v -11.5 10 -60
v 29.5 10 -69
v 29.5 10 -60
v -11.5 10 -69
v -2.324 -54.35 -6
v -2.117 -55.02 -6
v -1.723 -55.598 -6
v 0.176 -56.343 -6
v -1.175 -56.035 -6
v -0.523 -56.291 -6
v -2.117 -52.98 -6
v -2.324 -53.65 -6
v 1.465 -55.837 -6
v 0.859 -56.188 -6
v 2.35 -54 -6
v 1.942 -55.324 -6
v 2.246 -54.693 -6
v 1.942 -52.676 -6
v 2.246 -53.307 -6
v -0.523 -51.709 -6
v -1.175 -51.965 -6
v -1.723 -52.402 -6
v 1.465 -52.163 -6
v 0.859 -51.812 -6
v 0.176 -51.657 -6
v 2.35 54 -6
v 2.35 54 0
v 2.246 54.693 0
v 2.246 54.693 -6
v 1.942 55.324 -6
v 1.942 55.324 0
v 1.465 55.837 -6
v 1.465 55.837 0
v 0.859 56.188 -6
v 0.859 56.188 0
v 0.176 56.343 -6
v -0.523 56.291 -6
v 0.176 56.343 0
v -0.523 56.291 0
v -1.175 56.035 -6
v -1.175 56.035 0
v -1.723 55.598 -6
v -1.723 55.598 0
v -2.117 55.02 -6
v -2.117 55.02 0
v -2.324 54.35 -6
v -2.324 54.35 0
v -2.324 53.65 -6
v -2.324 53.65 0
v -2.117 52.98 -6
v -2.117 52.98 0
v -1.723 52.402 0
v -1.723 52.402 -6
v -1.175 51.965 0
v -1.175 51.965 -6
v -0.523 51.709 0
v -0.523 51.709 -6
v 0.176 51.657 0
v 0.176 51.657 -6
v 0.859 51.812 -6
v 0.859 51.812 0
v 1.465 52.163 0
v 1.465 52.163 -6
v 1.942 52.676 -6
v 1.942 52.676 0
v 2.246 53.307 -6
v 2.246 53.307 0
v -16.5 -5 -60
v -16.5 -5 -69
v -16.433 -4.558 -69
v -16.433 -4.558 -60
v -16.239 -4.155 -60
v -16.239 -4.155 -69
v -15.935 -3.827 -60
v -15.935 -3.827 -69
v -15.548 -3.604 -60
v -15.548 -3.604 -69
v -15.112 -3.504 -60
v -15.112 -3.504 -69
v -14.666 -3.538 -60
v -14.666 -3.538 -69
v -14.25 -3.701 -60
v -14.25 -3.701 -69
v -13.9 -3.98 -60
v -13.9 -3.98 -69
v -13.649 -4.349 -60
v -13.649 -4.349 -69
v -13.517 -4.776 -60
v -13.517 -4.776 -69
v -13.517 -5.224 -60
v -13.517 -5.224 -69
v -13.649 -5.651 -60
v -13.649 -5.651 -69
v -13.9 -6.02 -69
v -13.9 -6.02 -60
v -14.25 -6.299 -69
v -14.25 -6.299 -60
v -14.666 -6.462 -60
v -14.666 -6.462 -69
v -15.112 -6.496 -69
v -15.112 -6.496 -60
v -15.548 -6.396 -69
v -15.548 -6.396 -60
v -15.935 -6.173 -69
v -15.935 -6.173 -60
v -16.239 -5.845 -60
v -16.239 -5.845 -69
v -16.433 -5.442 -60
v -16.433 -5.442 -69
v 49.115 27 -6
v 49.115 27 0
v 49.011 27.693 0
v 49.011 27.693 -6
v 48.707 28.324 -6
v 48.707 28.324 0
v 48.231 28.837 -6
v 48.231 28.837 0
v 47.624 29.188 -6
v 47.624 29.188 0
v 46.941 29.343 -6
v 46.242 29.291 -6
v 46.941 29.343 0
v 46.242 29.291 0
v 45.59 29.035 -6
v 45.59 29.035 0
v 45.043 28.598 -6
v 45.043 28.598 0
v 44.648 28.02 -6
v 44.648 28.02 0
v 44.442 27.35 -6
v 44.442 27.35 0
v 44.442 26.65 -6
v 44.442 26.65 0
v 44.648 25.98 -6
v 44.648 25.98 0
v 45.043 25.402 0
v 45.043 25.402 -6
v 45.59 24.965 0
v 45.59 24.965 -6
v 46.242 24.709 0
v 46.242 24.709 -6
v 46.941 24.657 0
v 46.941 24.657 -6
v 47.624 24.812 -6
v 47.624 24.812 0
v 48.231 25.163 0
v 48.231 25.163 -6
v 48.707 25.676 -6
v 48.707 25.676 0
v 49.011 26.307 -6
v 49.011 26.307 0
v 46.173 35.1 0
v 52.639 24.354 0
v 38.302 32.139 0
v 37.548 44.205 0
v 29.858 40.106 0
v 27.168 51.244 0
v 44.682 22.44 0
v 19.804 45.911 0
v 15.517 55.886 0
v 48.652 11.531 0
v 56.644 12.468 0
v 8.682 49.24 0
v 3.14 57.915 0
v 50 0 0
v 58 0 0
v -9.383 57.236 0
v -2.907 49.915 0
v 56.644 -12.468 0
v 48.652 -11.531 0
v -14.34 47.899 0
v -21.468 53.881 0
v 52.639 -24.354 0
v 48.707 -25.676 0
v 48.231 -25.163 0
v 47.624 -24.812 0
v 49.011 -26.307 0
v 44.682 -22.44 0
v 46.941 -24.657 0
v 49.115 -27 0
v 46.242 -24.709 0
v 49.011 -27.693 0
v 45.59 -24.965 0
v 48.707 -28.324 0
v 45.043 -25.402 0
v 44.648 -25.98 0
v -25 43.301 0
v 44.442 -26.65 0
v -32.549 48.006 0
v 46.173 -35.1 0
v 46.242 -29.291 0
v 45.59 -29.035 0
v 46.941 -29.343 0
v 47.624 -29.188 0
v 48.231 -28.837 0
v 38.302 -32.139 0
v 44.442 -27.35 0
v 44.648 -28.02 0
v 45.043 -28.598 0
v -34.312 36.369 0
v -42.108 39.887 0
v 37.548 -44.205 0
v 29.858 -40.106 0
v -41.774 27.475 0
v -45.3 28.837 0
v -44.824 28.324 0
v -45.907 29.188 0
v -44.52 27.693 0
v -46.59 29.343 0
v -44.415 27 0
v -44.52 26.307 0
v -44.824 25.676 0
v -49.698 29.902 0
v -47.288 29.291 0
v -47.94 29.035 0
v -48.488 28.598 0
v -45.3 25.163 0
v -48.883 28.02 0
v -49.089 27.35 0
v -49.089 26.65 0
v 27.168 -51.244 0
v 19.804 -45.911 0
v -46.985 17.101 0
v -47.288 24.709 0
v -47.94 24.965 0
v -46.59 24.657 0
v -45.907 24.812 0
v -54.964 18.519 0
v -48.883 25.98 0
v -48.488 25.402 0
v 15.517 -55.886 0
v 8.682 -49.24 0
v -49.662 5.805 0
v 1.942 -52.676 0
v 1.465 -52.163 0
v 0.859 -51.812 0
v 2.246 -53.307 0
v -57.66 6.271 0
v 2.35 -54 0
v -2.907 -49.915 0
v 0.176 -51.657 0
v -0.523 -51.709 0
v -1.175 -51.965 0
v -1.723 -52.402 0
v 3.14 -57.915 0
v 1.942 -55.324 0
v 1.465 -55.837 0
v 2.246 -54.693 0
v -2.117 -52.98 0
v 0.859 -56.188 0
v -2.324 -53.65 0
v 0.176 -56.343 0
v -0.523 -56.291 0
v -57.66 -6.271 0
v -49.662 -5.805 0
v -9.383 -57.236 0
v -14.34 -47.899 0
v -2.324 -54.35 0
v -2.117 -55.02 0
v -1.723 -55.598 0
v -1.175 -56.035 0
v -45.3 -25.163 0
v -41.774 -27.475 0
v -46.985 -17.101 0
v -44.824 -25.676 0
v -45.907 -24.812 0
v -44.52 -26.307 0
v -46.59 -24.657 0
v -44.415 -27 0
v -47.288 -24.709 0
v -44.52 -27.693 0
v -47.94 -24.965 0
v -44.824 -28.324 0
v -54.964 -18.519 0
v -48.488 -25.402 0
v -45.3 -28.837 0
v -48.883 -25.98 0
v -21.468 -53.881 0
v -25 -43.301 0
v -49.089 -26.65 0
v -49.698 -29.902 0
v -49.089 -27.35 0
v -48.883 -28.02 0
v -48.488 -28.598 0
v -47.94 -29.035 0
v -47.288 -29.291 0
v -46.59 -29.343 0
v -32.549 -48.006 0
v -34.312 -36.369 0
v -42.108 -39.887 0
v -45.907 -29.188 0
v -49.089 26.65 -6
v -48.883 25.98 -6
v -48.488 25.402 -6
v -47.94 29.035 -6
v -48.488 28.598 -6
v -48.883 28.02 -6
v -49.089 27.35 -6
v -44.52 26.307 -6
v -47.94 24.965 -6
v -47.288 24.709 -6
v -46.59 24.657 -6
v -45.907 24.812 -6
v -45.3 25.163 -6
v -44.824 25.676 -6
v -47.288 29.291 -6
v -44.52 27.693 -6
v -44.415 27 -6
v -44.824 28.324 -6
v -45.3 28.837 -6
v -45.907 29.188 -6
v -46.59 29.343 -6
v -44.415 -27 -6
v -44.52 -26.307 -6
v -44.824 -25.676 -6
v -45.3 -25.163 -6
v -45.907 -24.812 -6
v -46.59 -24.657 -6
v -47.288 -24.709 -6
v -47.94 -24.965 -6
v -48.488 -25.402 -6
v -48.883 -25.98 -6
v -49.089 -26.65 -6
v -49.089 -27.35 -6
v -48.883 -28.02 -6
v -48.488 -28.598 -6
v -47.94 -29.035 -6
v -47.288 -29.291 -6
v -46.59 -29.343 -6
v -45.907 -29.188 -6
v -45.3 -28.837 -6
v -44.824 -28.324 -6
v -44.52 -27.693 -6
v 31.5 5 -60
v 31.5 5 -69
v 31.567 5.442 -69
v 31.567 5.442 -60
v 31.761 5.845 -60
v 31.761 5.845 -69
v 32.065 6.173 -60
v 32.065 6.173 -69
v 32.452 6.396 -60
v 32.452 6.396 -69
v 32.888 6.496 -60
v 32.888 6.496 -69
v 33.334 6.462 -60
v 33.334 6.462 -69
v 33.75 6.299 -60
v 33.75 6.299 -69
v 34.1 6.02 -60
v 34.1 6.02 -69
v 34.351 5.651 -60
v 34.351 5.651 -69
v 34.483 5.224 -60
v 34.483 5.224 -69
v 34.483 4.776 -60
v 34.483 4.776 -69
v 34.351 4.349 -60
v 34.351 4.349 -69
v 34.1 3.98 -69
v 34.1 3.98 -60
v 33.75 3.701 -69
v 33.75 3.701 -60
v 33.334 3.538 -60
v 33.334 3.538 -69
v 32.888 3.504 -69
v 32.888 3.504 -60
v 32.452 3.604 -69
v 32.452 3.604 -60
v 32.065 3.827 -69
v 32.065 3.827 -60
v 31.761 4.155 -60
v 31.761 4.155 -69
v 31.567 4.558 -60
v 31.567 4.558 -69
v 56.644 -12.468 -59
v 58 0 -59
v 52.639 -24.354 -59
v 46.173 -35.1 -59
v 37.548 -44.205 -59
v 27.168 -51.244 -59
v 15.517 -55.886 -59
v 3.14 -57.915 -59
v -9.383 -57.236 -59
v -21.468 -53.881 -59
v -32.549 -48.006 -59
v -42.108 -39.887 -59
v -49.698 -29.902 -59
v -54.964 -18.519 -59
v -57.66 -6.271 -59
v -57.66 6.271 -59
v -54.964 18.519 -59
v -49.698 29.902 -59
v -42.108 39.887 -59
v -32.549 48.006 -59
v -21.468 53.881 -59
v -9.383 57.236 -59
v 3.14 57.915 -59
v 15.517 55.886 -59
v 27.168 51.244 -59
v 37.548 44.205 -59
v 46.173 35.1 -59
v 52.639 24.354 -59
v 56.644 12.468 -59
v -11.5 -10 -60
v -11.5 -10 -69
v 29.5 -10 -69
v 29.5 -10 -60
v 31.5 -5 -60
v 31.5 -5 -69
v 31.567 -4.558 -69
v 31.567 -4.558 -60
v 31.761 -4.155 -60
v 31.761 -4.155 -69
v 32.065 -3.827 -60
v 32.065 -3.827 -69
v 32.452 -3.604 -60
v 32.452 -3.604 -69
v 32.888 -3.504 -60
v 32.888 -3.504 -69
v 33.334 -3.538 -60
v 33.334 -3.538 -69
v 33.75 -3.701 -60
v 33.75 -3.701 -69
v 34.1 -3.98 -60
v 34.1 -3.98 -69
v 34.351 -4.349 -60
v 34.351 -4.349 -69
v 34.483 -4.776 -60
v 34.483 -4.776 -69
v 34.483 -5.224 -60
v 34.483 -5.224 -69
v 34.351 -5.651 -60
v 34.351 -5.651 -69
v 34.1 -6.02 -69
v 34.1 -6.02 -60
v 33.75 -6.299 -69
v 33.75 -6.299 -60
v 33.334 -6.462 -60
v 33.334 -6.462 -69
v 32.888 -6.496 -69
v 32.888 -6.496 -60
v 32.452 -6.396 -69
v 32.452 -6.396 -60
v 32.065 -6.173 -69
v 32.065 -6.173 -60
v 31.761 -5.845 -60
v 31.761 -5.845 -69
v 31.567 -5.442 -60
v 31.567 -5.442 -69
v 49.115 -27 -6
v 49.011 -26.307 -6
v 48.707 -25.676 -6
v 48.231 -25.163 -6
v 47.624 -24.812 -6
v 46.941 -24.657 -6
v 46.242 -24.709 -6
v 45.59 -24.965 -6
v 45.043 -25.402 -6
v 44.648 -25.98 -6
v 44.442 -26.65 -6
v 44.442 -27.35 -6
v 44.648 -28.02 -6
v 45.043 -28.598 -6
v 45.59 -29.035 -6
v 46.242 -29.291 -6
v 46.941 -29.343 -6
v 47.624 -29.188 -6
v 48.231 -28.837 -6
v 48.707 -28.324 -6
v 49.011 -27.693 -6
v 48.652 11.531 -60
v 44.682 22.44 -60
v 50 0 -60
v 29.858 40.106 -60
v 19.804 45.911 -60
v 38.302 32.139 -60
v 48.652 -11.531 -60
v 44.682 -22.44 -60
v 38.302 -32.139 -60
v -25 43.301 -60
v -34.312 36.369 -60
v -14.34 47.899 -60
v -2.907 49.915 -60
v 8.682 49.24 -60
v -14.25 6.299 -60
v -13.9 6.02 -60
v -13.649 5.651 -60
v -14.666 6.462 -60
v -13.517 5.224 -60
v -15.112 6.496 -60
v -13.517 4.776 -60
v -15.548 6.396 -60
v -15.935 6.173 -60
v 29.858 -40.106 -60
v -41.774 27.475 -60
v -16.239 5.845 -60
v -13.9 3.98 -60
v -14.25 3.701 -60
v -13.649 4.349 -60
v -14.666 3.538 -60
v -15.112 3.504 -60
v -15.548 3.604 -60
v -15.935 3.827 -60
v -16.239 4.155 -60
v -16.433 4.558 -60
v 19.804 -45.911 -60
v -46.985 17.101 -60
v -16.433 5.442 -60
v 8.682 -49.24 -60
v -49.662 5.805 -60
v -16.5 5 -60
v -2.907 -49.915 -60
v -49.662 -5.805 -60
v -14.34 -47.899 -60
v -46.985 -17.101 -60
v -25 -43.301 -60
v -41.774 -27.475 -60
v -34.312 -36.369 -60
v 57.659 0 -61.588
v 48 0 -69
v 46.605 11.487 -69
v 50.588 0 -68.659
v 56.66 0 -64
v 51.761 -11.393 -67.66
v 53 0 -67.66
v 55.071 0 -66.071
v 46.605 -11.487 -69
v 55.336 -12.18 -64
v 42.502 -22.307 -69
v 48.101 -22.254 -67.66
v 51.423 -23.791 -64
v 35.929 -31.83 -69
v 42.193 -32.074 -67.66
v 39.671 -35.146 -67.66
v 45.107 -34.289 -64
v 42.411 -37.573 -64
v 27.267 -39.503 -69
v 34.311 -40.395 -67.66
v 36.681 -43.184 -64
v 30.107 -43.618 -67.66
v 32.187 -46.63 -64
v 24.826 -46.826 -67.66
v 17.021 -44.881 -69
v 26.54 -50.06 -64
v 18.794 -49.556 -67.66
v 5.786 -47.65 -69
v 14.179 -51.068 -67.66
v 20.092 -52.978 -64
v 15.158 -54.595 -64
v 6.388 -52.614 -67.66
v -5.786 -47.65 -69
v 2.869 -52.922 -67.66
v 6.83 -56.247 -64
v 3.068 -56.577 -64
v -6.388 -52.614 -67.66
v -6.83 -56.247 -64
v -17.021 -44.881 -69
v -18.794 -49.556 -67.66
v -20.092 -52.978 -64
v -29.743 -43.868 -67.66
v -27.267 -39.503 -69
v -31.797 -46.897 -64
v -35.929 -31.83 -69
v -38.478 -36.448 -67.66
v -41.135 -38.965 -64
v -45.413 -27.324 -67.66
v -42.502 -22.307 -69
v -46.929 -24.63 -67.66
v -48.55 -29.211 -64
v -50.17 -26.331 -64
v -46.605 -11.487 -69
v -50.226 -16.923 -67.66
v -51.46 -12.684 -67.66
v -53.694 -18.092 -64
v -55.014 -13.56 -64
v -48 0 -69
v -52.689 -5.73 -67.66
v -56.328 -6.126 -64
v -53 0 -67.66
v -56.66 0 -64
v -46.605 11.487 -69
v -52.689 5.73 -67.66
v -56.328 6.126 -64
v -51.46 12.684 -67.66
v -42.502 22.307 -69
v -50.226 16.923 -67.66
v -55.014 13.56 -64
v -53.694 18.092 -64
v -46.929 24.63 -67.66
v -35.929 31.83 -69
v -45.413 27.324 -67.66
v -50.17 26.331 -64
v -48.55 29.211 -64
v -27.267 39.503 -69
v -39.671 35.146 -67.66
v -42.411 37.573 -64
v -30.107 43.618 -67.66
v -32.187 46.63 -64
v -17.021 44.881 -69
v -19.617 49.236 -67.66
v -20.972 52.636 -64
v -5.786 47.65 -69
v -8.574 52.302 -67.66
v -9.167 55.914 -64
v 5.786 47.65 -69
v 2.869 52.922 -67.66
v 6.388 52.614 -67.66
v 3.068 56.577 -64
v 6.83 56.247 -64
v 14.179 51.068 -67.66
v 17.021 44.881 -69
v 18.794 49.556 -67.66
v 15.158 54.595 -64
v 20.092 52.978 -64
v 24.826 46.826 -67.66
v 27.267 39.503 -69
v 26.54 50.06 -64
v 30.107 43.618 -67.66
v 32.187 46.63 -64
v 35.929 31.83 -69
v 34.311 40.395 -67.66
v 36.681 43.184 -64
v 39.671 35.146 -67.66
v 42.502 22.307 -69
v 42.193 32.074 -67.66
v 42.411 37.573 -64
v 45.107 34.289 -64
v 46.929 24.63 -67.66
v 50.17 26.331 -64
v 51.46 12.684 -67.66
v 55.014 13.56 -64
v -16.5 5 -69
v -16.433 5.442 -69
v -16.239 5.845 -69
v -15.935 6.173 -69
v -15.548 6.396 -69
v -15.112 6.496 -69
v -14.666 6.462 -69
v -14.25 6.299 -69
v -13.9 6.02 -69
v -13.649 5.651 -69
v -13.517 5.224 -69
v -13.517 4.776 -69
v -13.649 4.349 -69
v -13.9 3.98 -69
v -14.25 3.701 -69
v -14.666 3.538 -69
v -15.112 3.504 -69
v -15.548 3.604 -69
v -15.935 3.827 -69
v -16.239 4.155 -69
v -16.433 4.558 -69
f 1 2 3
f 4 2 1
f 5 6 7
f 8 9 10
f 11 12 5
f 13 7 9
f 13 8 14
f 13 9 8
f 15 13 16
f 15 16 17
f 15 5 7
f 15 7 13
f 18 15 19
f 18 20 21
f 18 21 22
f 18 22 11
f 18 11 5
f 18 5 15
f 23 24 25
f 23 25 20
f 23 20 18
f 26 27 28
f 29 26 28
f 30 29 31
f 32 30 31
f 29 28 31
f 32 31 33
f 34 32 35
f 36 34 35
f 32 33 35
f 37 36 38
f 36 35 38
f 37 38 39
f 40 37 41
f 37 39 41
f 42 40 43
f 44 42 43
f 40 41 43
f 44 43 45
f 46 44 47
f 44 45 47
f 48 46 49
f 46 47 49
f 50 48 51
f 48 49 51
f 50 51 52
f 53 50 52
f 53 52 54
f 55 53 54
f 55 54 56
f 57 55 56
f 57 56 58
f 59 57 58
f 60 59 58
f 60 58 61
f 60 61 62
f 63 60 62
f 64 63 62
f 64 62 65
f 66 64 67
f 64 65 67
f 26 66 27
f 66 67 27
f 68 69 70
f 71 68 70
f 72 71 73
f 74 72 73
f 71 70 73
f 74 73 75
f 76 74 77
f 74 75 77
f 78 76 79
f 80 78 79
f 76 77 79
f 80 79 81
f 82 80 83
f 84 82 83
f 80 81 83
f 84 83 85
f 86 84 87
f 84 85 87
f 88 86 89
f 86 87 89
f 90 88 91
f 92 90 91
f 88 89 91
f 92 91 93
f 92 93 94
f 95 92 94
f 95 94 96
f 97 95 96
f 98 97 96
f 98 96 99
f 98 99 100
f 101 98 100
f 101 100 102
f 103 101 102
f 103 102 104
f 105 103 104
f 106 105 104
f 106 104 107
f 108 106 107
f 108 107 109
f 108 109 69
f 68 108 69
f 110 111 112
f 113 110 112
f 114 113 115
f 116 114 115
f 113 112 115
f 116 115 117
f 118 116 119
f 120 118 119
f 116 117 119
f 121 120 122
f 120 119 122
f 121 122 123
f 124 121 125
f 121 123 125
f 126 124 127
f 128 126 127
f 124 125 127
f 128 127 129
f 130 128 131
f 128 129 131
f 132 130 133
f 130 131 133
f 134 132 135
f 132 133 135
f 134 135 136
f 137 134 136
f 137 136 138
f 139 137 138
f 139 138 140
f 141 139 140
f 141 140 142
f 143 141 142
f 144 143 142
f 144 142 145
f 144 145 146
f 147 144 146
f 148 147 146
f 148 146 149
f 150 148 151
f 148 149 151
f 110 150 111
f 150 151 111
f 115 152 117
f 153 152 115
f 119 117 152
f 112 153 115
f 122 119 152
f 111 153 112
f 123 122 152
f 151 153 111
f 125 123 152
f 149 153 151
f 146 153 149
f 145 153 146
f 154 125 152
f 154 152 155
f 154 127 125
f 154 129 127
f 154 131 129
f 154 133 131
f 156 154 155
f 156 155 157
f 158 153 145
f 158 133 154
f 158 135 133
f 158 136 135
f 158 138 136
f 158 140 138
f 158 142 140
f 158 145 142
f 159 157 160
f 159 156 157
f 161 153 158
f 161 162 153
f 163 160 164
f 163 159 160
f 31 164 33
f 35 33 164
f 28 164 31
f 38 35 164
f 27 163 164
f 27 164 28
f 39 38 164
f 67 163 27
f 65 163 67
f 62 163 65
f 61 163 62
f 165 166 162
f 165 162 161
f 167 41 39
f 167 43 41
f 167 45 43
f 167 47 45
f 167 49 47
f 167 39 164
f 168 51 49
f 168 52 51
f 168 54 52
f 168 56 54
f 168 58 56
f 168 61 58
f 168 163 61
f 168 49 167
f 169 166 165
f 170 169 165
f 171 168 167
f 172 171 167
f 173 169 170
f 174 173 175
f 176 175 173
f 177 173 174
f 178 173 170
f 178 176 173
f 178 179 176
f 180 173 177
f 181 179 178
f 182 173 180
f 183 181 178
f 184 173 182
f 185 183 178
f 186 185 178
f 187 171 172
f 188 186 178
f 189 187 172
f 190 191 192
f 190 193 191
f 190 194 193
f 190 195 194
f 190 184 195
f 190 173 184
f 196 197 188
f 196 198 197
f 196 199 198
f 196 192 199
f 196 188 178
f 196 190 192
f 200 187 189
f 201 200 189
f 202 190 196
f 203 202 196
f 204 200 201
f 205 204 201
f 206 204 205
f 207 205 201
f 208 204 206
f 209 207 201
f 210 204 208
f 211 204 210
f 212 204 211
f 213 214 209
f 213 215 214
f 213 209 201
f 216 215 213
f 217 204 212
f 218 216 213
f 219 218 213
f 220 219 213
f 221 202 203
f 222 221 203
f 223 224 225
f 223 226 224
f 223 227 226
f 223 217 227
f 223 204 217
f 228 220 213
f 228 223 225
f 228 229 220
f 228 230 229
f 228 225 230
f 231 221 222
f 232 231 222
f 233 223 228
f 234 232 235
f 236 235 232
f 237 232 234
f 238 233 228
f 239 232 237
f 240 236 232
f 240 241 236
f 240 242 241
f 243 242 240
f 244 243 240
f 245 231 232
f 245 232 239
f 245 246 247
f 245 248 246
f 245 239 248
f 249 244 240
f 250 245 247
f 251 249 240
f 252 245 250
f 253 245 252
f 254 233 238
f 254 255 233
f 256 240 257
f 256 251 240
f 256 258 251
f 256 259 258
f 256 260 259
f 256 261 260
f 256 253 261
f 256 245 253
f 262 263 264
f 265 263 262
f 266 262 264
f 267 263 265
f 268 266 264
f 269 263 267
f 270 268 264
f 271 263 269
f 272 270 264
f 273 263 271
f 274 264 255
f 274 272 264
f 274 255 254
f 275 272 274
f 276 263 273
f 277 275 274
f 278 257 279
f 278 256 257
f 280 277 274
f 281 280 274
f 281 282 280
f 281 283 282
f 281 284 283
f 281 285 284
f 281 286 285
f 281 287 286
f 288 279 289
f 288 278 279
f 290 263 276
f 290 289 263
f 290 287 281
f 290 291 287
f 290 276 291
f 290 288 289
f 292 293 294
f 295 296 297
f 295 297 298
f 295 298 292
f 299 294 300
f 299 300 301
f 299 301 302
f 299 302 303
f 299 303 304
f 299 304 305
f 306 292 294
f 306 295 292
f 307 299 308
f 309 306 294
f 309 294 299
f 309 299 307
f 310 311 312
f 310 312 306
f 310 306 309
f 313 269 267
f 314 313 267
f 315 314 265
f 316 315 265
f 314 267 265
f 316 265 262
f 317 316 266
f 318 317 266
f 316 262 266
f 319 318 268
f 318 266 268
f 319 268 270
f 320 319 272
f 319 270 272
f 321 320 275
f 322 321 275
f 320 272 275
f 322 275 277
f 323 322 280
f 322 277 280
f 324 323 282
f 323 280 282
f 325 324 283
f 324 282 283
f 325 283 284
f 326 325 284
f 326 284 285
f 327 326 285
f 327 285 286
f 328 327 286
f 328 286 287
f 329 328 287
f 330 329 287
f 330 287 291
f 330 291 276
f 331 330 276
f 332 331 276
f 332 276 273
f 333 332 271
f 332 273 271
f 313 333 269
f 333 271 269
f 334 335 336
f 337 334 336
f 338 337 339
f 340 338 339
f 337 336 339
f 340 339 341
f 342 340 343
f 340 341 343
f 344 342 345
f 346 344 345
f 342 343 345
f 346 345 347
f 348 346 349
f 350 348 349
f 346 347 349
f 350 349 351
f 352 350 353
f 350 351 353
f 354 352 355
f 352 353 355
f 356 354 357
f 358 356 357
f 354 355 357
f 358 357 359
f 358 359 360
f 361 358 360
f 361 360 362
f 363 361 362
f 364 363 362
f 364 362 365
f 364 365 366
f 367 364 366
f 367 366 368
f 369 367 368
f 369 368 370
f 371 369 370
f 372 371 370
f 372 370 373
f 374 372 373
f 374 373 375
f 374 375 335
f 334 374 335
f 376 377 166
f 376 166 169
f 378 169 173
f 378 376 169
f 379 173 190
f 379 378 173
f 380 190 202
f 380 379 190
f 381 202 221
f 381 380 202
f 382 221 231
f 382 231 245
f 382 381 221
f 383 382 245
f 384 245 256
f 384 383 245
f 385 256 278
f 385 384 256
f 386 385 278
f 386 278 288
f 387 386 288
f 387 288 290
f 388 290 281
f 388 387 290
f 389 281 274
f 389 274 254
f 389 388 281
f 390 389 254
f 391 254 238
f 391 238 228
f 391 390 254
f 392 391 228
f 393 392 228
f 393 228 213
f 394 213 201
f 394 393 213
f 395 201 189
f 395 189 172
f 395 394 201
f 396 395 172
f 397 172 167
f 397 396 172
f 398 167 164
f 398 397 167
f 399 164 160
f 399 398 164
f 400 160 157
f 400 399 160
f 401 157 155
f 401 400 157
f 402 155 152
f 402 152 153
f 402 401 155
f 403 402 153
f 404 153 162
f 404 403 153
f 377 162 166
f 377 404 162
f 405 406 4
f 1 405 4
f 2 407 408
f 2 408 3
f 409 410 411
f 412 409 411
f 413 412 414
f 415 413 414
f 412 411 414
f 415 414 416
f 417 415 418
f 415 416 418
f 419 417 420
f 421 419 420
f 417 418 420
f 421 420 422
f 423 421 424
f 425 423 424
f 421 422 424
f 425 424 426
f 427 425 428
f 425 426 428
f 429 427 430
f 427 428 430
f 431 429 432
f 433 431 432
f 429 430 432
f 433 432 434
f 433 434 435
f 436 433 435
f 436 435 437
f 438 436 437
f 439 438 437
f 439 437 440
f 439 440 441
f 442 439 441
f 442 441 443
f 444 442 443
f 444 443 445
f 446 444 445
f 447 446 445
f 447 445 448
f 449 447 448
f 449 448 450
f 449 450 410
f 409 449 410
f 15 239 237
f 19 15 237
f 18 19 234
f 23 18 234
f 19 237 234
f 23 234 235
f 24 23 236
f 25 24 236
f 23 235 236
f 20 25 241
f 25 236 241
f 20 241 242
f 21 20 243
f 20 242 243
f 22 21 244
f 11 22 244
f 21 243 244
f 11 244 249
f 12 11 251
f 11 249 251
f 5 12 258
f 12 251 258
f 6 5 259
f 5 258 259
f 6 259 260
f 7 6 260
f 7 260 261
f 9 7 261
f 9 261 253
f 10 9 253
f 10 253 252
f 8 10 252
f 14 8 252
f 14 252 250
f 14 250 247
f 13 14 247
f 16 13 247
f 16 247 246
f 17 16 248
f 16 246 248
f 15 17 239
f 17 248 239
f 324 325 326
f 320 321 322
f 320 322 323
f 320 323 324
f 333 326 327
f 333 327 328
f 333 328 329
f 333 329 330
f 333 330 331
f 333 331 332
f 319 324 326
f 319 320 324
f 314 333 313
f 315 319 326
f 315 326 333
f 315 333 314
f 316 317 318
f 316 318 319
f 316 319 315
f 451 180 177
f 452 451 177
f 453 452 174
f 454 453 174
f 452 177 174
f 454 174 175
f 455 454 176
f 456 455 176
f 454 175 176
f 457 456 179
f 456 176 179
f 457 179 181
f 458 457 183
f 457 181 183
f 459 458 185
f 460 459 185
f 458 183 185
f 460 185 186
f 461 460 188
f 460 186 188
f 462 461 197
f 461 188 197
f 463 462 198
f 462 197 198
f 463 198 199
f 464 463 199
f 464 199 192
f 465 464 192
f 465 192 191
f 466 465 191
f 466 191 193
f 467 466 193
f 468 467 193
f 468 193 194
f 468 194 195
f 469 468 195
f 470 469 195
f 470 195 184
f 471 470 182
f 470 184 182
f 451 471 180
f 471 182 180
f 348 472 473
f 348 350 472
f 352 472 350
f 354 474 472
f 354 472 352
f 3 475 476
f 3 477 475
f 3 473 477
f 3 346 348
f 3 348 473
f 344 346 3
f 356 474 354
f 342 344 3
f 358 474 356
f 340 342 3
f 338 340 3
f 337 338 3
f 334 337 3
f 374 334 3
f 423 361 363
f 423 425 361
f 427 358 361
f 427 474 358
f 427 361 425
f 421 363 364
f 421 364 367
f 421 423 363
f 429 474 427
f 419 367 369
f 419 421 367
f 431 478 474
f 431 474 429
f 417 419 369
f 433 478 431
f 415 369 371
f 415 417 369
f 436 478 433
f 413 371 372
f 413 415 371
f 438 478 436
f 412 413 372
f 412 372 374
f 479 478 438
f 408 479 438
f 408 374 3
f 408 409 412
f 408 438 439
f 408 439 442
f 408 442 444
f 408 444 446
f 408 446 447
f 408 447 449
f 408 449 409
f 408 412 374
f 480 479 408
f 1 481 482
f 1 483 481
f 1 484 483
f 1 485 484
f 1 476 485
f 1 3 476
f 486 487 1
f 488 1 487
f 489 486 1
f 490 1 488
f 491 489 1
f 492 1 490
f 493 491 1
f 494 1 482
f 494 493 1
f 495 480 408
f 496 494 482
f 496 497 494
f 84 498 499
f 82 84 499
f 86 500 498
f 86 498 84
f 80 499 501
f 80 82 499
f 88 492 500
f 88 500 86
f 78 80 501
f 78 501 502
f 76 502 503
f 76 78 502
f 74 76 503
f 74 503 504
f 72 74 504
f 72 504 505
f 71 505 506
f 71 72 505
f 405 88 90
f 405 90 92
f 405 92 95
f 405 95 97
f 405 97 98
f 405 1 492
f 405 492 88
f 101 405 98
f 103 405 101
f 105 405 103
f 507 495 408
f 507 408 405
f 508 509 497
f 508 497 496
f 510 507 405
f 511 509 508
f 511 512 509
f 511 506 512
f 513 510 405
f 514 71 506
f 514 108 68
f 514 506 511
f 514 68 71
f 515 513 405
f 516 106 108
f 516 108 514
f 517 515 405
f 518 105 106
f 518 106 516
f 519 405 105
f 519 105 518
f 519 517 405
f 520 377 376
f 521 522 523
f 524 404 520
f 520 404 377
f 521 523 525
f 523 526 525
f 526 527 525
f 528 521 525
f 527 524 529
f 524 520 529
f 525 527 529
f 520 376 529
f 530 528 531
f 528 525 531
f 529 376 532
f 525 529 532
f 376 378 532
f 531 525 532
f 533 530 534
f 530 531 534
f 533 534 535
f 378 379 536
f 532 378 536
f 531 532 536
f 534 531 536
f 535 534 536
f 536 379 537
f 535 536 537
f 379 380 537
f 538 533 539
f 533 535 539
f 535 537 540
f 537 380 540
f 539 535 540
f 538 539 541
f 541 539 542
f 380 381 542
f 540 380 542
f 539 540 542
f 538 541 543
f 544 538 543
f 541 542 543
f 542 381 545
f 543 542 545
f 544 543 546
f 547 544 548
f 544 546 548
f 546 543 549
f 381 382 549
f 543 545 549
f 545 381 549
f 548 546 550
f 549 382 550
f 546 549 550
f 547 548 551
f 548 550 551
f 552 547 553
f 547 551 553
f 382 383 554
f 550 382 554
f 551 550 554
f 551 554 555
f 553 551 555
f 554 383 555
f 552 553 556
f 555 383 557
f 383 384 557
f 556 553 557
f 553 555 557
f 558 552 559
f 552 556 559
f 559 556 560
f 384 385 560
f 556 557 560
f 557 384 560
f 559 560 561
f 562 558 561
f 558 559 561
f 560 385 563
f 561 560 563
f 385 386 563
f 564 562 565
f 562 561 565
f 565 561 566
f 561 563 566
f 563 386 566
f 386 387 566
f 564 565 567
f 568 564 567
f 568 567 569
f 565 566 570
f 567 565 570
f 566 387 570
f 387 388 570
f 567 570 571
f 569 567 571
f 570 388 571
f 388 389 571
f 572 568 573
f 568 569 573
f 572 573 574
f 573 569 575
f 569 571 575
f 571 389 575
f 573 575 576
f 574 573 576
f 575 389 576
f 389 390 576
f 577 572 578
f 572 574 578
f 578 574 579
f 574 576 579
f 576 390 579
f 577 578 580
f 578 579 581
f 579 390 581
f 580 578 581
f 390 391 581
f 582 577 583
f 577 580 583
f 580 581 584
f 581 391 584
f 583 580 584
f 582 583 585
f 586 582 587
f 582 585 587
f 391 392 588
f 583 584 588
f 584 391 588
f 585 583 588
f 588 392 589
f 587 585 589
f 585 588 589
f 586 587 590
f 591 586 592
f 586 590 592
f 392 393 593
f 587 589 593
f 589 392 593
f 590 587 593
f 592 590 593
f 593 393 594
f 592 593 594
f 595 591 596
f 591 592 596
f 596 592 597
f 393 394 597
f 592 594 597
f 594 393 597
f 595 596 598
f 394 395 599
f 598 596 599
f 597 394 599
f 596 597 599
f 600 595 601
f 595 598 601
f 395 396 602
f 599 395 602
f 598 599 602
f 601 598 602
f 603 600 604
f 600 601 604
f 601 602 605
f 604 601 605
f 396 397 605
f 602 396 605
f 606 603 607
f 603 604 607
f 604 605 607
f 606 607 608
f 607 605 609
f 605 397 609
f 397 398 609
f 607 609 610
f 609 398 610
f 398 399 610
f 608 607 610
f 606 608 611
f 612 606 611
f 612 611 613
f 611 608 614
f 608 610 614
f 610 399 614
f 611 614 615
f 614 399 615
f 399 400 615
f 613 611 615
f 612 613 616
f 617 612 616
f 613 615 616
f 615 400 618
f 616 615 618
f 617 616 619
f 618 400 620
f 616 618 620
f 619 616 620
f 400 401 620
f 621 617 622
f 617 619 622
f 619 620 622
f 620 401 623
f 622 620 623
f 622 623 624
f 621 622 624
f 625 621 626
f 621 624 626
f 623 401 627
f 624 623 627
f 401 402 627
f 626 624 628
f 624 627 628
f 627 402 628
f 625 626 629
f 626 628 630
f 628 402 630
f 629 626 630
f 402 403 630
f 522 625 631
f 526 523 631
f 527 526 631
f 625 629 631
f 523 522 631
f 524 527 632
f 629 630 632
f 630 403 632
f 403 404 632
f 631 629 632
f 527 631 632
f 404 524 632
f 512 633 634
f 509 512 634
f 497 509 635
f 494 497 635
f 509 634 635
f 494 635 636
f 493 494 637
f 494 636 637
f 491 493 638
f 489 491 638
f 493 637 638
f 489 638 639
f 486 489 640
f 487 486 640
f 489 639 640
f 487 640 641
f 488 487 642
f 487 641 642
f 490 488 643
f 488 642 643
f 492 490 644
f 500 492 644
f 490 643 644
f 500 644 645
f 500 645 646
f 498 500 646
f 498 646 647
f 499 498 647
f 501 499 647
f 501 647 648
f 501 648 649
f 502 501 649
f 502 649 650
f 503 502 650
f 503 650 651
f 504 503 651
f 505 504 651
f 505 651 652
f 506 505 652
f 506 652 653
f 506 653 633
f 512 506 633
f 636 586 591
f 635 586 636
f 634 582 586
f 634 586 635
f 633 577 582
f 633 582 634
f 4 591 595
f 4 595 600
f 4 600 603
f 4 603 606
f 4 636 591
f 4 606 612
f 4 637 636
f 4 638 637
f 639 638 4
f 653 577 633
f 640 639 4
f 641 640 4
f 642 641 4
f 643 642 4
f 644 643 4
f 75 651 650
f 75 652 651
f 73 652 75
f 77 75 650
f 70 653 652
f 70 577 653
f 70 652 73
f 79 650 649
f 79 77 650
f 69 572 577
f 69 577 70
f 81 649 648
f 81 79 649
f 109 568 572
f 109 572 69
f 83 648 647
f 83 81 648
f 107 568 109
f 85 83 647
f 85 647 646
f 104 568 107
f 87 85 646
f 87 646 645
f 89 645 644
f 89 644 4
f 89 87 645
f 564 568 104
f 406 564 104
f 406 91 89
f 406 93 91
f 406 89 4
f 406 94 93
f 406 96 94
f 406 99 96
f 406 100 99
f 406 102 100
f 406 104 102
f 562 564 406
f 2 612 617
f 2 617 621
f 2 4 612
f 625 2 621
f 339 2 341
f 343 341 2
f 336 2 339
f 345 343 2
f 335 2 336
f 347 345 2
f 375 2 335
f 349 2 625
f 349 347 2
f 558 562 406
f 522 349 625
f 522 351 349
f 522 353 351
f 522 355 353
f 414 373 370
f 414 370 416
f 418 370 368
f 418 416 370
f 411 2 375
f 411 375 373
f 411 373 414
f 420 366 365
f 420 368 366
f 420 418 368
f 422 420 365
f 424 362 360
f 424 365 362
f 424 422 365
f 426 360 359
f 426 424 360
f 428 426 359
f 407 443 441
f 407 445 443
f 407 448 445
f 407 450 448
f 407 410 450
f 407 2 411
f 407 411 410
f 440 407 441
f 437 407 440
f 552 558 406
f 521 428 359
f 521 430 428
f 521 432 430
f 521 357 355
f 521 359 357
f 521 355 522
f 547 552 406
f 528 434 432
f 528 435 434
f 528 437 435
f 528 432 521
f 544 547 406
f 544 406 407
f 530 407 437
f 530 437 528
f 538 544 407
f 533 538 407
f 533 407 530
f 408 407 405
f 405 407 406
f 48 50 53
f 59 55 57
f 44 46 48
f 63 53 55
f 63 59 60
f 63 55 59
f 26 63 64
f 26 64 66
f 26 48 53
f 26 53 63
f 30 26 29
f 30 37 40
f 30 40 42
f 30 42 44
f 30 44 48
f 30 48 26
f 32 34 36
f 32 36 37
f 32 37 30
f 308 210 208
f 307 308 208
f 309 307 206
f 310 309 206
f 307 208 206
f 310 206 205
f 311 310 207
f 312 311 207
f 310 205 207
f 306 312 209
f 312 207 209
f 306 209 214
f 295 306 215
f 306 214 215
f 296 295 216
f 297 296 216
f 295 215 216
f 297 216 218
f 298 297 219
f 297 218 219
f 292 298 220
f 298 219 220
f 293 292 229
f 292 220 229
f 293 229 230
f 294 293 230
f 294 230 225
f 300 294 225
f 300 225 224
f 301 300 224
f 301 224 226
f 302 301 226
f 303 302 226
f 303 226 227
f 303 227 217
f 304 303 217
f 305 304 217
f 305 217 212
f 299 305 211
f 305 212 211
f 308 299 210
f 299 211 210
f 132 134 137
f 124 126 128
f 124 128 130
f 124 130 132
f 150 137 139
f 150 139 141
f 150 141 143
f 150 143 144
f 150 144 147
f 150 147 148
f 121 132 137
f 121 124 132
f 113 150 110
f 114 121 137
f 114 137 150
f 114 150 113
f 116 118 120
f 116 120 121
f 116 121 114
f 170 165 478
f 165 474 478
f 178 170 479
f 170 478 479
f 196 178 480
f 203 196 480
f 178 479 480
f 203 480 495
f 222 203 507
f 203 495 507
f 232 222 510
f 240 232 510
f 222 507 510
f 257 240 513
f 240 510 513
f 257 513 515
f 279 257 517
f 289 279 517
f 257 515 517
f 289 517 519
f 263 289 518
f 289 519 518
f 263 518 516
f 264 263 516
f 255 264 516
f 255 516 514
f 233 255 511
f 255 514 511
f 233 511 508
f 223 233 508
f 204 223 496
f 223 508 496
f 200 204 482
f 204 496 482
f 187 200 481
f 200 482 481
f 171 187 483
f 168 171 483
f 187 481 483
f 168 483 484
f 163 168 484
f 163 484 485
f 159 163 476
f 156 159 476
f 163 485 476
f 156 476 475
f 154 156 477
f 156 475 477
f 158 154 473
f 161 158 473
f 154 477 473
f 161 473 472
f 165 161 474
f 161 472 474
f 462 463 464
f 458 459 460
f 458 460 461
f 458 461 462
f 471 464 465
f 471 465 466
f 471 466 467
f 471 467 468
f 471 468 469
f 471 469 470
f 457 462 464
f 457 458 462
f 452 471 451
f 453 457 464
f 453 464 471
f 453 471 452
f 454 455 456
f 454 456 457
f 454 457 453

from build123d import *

# Parameters (mm, degrees)
SKETCH2_W          = 50
SKETCH2_H          = 9
SKETCH2_W_2        = 8
SKETCH2_H_2        = 60
SKETCH3_R          = 2.35
CUT_EXTRUDE1_DEPTH = 6
CUT_EXTRUDE2_REACH = 109.187
SKETCH4_R          = 1.5
SKETCH4_W          = 41
SKETCH4_H          = 20
FILLET1_R          = 10


with BuildPart() as part:
    # Sketch2 → Revolve1 (revolve)
    with BuildSketch(Plane(origin=(0, 0, 0), x_dir=(1, 0, 0), z_dir=(0, 1, 0))):
        with Locations((25, 64.5)):
            Rectangle(SKETCH2_W, SKETCH2_H)
        with Locations((54, 64.5)):
            Rectangle(SKETCH2_W_2, SKETCH2_H)
        with Locations((54, 30)):
            Rectangle(SKETCH2_W_2, SKETCH2_H_2)
    revolve(axis=Axis((0, 0, 1000), (0, 0, -1)))

    # Sketch3 → Cut-Extrude1 (cut)
    with BuildSketch(Plane.XY):
        with Locations((46.765371804, 27)):
            Circle(SKETCH3_R)
        with Locations((0, 54)):
            Circle(SKETCH3_R)
        with Locations((46.765371804, -27)):
            Circle(SKETCH3_R)
        with Locations((0, -54)):
            Circle(SKETCH3_R)
        with Locations((-46.765371804, -27)):
            Circle(SKETCH3_R)
        with Locations((-46.765371804, 27)):
            Circle(SKETCH3_R)
    extrude(amount=-CUT_EXTRUDE1_DEPTH, mode=Mode.SUBTRACT)

    # Sketch4 → Cut-Extrude2 (cut, up to next)
    with BuildSketch(Plane(origin=(0, 0, -69), x_dir=(-1, 0, 0), z_dir=(0, 0, -1)), mode=Mode.PRIVATE) as cut_extrude2_sk1:
        with Locations((15, 5)):
            Circle(SKETCH4_R)
    cut_extrude2_tool1 = extrude(cut_extrude2_sk1.sketch, amount=-CUT_EXTRUDE2_REACH, mode=Mode.PRIVATE) & part.part
    # Sketch4 → Cut-Extrude2 (cut, up to next)
    with BuildSketch(Plane(origin=(0, 0, -69), x_dir=(-1, 0, 0), z_dir=(0, 0, -1)), mode=Mode.PRIVATE) as cut_extrude2_sk2:
        with Locations((15, -5)):
            Circle(SKETCH4_R)
    cut_extrude2_tool2 = extrude(cut_extrude2_sk2.sketch, amount=-CUT_EXTRUDE2_REACH, mode=Mode.PRIVATE) & part.part
    # Sketch4 → Cut-Extrude2 (cut, up to next)
    with BuildSketch(Plane(origin=(0, 0, -69), x_dir=(-1, 0, 0), z_dir=(0, 0, -1)), mode=Mode.PRIVATE) as cut_extrude2_sk3:
        with Locations((-33, -5)):
            Circle(SKETCH4_R)
    cut_extrude2_tool3 = extrude(cut_extrude2_sk3.sketch, amount=-CUT_EXTRUDE2_REACH, mode=Mode.PRIVATE) & part.part
    # Sketch4 → Cut-Extrude2 (cut, up to next)
    with BuildSketch(Plane(origin=(0, 0, -69), x_dir=(-1, 0, 0), z_dir=(0, 0, -1)), mode=Mode.PRIVATE) as cut_extrude2_sk4:
        with Locations((-33, 5)):
            Circle(SKETCH4_R)
    cut_extrude2_tool4 = extrude(cut_extrude2_sk4.sketch, amount=-CUT_EXTRUDE2_REACH, mode=Mode.PRIVATE) & part.part
    # Sketch4 → Cut-Extrude2 (cut, up to next)
    with BuildSketch(Plane(origin=(0, 0, -69), x_dir=(-1, 0, 0), z_dir=(0, 0, -1)), mode=Mode.PRIVATE) as cut_extrude2_sk5:
        with Locations((-9, 0)):
            Rectangle(SKETCH4_W, SKETCH4_H)
    cut_extrude2_tool5 = extrude(cut_extrude2_sk5.sketch, amount=-CUT_EXTRUDE2_REACH, mode=Mode.PRIVATE) & part.part
    add(cut_extrude2_tool1.solids().sort_by_distance((-15, 5, -69))[0], mode=Mode.SUBTRACT)
    add(cut_extrude2_tool2.solids().sort_by_distance((-15, -5, -69))[0], mode=Mode.SUBTRACT)
    add(cut_extrude2_tool3.solids().sort_by_distance((33, -5, -69))[0], mode=Mode.SUBTRACT)
    add(cut_extrude2_tool4.solids().sort_by_distance((33, 5, -69))[0], mode=Mode.SUBTRACT)
    add(cut_extrude2_tool5.solids().sort_by_distance((9, 0, -69))[0], mode=Mode.SUBTRACT)

    # Fillet1
    fillet1_edges = [part.edges().sort_by_distance(p)[0] for p in [
        (-58, 0, -69),
    ]]
    fillet(fillet1_edges, radius=FILLET1_R)


solid = part.part
